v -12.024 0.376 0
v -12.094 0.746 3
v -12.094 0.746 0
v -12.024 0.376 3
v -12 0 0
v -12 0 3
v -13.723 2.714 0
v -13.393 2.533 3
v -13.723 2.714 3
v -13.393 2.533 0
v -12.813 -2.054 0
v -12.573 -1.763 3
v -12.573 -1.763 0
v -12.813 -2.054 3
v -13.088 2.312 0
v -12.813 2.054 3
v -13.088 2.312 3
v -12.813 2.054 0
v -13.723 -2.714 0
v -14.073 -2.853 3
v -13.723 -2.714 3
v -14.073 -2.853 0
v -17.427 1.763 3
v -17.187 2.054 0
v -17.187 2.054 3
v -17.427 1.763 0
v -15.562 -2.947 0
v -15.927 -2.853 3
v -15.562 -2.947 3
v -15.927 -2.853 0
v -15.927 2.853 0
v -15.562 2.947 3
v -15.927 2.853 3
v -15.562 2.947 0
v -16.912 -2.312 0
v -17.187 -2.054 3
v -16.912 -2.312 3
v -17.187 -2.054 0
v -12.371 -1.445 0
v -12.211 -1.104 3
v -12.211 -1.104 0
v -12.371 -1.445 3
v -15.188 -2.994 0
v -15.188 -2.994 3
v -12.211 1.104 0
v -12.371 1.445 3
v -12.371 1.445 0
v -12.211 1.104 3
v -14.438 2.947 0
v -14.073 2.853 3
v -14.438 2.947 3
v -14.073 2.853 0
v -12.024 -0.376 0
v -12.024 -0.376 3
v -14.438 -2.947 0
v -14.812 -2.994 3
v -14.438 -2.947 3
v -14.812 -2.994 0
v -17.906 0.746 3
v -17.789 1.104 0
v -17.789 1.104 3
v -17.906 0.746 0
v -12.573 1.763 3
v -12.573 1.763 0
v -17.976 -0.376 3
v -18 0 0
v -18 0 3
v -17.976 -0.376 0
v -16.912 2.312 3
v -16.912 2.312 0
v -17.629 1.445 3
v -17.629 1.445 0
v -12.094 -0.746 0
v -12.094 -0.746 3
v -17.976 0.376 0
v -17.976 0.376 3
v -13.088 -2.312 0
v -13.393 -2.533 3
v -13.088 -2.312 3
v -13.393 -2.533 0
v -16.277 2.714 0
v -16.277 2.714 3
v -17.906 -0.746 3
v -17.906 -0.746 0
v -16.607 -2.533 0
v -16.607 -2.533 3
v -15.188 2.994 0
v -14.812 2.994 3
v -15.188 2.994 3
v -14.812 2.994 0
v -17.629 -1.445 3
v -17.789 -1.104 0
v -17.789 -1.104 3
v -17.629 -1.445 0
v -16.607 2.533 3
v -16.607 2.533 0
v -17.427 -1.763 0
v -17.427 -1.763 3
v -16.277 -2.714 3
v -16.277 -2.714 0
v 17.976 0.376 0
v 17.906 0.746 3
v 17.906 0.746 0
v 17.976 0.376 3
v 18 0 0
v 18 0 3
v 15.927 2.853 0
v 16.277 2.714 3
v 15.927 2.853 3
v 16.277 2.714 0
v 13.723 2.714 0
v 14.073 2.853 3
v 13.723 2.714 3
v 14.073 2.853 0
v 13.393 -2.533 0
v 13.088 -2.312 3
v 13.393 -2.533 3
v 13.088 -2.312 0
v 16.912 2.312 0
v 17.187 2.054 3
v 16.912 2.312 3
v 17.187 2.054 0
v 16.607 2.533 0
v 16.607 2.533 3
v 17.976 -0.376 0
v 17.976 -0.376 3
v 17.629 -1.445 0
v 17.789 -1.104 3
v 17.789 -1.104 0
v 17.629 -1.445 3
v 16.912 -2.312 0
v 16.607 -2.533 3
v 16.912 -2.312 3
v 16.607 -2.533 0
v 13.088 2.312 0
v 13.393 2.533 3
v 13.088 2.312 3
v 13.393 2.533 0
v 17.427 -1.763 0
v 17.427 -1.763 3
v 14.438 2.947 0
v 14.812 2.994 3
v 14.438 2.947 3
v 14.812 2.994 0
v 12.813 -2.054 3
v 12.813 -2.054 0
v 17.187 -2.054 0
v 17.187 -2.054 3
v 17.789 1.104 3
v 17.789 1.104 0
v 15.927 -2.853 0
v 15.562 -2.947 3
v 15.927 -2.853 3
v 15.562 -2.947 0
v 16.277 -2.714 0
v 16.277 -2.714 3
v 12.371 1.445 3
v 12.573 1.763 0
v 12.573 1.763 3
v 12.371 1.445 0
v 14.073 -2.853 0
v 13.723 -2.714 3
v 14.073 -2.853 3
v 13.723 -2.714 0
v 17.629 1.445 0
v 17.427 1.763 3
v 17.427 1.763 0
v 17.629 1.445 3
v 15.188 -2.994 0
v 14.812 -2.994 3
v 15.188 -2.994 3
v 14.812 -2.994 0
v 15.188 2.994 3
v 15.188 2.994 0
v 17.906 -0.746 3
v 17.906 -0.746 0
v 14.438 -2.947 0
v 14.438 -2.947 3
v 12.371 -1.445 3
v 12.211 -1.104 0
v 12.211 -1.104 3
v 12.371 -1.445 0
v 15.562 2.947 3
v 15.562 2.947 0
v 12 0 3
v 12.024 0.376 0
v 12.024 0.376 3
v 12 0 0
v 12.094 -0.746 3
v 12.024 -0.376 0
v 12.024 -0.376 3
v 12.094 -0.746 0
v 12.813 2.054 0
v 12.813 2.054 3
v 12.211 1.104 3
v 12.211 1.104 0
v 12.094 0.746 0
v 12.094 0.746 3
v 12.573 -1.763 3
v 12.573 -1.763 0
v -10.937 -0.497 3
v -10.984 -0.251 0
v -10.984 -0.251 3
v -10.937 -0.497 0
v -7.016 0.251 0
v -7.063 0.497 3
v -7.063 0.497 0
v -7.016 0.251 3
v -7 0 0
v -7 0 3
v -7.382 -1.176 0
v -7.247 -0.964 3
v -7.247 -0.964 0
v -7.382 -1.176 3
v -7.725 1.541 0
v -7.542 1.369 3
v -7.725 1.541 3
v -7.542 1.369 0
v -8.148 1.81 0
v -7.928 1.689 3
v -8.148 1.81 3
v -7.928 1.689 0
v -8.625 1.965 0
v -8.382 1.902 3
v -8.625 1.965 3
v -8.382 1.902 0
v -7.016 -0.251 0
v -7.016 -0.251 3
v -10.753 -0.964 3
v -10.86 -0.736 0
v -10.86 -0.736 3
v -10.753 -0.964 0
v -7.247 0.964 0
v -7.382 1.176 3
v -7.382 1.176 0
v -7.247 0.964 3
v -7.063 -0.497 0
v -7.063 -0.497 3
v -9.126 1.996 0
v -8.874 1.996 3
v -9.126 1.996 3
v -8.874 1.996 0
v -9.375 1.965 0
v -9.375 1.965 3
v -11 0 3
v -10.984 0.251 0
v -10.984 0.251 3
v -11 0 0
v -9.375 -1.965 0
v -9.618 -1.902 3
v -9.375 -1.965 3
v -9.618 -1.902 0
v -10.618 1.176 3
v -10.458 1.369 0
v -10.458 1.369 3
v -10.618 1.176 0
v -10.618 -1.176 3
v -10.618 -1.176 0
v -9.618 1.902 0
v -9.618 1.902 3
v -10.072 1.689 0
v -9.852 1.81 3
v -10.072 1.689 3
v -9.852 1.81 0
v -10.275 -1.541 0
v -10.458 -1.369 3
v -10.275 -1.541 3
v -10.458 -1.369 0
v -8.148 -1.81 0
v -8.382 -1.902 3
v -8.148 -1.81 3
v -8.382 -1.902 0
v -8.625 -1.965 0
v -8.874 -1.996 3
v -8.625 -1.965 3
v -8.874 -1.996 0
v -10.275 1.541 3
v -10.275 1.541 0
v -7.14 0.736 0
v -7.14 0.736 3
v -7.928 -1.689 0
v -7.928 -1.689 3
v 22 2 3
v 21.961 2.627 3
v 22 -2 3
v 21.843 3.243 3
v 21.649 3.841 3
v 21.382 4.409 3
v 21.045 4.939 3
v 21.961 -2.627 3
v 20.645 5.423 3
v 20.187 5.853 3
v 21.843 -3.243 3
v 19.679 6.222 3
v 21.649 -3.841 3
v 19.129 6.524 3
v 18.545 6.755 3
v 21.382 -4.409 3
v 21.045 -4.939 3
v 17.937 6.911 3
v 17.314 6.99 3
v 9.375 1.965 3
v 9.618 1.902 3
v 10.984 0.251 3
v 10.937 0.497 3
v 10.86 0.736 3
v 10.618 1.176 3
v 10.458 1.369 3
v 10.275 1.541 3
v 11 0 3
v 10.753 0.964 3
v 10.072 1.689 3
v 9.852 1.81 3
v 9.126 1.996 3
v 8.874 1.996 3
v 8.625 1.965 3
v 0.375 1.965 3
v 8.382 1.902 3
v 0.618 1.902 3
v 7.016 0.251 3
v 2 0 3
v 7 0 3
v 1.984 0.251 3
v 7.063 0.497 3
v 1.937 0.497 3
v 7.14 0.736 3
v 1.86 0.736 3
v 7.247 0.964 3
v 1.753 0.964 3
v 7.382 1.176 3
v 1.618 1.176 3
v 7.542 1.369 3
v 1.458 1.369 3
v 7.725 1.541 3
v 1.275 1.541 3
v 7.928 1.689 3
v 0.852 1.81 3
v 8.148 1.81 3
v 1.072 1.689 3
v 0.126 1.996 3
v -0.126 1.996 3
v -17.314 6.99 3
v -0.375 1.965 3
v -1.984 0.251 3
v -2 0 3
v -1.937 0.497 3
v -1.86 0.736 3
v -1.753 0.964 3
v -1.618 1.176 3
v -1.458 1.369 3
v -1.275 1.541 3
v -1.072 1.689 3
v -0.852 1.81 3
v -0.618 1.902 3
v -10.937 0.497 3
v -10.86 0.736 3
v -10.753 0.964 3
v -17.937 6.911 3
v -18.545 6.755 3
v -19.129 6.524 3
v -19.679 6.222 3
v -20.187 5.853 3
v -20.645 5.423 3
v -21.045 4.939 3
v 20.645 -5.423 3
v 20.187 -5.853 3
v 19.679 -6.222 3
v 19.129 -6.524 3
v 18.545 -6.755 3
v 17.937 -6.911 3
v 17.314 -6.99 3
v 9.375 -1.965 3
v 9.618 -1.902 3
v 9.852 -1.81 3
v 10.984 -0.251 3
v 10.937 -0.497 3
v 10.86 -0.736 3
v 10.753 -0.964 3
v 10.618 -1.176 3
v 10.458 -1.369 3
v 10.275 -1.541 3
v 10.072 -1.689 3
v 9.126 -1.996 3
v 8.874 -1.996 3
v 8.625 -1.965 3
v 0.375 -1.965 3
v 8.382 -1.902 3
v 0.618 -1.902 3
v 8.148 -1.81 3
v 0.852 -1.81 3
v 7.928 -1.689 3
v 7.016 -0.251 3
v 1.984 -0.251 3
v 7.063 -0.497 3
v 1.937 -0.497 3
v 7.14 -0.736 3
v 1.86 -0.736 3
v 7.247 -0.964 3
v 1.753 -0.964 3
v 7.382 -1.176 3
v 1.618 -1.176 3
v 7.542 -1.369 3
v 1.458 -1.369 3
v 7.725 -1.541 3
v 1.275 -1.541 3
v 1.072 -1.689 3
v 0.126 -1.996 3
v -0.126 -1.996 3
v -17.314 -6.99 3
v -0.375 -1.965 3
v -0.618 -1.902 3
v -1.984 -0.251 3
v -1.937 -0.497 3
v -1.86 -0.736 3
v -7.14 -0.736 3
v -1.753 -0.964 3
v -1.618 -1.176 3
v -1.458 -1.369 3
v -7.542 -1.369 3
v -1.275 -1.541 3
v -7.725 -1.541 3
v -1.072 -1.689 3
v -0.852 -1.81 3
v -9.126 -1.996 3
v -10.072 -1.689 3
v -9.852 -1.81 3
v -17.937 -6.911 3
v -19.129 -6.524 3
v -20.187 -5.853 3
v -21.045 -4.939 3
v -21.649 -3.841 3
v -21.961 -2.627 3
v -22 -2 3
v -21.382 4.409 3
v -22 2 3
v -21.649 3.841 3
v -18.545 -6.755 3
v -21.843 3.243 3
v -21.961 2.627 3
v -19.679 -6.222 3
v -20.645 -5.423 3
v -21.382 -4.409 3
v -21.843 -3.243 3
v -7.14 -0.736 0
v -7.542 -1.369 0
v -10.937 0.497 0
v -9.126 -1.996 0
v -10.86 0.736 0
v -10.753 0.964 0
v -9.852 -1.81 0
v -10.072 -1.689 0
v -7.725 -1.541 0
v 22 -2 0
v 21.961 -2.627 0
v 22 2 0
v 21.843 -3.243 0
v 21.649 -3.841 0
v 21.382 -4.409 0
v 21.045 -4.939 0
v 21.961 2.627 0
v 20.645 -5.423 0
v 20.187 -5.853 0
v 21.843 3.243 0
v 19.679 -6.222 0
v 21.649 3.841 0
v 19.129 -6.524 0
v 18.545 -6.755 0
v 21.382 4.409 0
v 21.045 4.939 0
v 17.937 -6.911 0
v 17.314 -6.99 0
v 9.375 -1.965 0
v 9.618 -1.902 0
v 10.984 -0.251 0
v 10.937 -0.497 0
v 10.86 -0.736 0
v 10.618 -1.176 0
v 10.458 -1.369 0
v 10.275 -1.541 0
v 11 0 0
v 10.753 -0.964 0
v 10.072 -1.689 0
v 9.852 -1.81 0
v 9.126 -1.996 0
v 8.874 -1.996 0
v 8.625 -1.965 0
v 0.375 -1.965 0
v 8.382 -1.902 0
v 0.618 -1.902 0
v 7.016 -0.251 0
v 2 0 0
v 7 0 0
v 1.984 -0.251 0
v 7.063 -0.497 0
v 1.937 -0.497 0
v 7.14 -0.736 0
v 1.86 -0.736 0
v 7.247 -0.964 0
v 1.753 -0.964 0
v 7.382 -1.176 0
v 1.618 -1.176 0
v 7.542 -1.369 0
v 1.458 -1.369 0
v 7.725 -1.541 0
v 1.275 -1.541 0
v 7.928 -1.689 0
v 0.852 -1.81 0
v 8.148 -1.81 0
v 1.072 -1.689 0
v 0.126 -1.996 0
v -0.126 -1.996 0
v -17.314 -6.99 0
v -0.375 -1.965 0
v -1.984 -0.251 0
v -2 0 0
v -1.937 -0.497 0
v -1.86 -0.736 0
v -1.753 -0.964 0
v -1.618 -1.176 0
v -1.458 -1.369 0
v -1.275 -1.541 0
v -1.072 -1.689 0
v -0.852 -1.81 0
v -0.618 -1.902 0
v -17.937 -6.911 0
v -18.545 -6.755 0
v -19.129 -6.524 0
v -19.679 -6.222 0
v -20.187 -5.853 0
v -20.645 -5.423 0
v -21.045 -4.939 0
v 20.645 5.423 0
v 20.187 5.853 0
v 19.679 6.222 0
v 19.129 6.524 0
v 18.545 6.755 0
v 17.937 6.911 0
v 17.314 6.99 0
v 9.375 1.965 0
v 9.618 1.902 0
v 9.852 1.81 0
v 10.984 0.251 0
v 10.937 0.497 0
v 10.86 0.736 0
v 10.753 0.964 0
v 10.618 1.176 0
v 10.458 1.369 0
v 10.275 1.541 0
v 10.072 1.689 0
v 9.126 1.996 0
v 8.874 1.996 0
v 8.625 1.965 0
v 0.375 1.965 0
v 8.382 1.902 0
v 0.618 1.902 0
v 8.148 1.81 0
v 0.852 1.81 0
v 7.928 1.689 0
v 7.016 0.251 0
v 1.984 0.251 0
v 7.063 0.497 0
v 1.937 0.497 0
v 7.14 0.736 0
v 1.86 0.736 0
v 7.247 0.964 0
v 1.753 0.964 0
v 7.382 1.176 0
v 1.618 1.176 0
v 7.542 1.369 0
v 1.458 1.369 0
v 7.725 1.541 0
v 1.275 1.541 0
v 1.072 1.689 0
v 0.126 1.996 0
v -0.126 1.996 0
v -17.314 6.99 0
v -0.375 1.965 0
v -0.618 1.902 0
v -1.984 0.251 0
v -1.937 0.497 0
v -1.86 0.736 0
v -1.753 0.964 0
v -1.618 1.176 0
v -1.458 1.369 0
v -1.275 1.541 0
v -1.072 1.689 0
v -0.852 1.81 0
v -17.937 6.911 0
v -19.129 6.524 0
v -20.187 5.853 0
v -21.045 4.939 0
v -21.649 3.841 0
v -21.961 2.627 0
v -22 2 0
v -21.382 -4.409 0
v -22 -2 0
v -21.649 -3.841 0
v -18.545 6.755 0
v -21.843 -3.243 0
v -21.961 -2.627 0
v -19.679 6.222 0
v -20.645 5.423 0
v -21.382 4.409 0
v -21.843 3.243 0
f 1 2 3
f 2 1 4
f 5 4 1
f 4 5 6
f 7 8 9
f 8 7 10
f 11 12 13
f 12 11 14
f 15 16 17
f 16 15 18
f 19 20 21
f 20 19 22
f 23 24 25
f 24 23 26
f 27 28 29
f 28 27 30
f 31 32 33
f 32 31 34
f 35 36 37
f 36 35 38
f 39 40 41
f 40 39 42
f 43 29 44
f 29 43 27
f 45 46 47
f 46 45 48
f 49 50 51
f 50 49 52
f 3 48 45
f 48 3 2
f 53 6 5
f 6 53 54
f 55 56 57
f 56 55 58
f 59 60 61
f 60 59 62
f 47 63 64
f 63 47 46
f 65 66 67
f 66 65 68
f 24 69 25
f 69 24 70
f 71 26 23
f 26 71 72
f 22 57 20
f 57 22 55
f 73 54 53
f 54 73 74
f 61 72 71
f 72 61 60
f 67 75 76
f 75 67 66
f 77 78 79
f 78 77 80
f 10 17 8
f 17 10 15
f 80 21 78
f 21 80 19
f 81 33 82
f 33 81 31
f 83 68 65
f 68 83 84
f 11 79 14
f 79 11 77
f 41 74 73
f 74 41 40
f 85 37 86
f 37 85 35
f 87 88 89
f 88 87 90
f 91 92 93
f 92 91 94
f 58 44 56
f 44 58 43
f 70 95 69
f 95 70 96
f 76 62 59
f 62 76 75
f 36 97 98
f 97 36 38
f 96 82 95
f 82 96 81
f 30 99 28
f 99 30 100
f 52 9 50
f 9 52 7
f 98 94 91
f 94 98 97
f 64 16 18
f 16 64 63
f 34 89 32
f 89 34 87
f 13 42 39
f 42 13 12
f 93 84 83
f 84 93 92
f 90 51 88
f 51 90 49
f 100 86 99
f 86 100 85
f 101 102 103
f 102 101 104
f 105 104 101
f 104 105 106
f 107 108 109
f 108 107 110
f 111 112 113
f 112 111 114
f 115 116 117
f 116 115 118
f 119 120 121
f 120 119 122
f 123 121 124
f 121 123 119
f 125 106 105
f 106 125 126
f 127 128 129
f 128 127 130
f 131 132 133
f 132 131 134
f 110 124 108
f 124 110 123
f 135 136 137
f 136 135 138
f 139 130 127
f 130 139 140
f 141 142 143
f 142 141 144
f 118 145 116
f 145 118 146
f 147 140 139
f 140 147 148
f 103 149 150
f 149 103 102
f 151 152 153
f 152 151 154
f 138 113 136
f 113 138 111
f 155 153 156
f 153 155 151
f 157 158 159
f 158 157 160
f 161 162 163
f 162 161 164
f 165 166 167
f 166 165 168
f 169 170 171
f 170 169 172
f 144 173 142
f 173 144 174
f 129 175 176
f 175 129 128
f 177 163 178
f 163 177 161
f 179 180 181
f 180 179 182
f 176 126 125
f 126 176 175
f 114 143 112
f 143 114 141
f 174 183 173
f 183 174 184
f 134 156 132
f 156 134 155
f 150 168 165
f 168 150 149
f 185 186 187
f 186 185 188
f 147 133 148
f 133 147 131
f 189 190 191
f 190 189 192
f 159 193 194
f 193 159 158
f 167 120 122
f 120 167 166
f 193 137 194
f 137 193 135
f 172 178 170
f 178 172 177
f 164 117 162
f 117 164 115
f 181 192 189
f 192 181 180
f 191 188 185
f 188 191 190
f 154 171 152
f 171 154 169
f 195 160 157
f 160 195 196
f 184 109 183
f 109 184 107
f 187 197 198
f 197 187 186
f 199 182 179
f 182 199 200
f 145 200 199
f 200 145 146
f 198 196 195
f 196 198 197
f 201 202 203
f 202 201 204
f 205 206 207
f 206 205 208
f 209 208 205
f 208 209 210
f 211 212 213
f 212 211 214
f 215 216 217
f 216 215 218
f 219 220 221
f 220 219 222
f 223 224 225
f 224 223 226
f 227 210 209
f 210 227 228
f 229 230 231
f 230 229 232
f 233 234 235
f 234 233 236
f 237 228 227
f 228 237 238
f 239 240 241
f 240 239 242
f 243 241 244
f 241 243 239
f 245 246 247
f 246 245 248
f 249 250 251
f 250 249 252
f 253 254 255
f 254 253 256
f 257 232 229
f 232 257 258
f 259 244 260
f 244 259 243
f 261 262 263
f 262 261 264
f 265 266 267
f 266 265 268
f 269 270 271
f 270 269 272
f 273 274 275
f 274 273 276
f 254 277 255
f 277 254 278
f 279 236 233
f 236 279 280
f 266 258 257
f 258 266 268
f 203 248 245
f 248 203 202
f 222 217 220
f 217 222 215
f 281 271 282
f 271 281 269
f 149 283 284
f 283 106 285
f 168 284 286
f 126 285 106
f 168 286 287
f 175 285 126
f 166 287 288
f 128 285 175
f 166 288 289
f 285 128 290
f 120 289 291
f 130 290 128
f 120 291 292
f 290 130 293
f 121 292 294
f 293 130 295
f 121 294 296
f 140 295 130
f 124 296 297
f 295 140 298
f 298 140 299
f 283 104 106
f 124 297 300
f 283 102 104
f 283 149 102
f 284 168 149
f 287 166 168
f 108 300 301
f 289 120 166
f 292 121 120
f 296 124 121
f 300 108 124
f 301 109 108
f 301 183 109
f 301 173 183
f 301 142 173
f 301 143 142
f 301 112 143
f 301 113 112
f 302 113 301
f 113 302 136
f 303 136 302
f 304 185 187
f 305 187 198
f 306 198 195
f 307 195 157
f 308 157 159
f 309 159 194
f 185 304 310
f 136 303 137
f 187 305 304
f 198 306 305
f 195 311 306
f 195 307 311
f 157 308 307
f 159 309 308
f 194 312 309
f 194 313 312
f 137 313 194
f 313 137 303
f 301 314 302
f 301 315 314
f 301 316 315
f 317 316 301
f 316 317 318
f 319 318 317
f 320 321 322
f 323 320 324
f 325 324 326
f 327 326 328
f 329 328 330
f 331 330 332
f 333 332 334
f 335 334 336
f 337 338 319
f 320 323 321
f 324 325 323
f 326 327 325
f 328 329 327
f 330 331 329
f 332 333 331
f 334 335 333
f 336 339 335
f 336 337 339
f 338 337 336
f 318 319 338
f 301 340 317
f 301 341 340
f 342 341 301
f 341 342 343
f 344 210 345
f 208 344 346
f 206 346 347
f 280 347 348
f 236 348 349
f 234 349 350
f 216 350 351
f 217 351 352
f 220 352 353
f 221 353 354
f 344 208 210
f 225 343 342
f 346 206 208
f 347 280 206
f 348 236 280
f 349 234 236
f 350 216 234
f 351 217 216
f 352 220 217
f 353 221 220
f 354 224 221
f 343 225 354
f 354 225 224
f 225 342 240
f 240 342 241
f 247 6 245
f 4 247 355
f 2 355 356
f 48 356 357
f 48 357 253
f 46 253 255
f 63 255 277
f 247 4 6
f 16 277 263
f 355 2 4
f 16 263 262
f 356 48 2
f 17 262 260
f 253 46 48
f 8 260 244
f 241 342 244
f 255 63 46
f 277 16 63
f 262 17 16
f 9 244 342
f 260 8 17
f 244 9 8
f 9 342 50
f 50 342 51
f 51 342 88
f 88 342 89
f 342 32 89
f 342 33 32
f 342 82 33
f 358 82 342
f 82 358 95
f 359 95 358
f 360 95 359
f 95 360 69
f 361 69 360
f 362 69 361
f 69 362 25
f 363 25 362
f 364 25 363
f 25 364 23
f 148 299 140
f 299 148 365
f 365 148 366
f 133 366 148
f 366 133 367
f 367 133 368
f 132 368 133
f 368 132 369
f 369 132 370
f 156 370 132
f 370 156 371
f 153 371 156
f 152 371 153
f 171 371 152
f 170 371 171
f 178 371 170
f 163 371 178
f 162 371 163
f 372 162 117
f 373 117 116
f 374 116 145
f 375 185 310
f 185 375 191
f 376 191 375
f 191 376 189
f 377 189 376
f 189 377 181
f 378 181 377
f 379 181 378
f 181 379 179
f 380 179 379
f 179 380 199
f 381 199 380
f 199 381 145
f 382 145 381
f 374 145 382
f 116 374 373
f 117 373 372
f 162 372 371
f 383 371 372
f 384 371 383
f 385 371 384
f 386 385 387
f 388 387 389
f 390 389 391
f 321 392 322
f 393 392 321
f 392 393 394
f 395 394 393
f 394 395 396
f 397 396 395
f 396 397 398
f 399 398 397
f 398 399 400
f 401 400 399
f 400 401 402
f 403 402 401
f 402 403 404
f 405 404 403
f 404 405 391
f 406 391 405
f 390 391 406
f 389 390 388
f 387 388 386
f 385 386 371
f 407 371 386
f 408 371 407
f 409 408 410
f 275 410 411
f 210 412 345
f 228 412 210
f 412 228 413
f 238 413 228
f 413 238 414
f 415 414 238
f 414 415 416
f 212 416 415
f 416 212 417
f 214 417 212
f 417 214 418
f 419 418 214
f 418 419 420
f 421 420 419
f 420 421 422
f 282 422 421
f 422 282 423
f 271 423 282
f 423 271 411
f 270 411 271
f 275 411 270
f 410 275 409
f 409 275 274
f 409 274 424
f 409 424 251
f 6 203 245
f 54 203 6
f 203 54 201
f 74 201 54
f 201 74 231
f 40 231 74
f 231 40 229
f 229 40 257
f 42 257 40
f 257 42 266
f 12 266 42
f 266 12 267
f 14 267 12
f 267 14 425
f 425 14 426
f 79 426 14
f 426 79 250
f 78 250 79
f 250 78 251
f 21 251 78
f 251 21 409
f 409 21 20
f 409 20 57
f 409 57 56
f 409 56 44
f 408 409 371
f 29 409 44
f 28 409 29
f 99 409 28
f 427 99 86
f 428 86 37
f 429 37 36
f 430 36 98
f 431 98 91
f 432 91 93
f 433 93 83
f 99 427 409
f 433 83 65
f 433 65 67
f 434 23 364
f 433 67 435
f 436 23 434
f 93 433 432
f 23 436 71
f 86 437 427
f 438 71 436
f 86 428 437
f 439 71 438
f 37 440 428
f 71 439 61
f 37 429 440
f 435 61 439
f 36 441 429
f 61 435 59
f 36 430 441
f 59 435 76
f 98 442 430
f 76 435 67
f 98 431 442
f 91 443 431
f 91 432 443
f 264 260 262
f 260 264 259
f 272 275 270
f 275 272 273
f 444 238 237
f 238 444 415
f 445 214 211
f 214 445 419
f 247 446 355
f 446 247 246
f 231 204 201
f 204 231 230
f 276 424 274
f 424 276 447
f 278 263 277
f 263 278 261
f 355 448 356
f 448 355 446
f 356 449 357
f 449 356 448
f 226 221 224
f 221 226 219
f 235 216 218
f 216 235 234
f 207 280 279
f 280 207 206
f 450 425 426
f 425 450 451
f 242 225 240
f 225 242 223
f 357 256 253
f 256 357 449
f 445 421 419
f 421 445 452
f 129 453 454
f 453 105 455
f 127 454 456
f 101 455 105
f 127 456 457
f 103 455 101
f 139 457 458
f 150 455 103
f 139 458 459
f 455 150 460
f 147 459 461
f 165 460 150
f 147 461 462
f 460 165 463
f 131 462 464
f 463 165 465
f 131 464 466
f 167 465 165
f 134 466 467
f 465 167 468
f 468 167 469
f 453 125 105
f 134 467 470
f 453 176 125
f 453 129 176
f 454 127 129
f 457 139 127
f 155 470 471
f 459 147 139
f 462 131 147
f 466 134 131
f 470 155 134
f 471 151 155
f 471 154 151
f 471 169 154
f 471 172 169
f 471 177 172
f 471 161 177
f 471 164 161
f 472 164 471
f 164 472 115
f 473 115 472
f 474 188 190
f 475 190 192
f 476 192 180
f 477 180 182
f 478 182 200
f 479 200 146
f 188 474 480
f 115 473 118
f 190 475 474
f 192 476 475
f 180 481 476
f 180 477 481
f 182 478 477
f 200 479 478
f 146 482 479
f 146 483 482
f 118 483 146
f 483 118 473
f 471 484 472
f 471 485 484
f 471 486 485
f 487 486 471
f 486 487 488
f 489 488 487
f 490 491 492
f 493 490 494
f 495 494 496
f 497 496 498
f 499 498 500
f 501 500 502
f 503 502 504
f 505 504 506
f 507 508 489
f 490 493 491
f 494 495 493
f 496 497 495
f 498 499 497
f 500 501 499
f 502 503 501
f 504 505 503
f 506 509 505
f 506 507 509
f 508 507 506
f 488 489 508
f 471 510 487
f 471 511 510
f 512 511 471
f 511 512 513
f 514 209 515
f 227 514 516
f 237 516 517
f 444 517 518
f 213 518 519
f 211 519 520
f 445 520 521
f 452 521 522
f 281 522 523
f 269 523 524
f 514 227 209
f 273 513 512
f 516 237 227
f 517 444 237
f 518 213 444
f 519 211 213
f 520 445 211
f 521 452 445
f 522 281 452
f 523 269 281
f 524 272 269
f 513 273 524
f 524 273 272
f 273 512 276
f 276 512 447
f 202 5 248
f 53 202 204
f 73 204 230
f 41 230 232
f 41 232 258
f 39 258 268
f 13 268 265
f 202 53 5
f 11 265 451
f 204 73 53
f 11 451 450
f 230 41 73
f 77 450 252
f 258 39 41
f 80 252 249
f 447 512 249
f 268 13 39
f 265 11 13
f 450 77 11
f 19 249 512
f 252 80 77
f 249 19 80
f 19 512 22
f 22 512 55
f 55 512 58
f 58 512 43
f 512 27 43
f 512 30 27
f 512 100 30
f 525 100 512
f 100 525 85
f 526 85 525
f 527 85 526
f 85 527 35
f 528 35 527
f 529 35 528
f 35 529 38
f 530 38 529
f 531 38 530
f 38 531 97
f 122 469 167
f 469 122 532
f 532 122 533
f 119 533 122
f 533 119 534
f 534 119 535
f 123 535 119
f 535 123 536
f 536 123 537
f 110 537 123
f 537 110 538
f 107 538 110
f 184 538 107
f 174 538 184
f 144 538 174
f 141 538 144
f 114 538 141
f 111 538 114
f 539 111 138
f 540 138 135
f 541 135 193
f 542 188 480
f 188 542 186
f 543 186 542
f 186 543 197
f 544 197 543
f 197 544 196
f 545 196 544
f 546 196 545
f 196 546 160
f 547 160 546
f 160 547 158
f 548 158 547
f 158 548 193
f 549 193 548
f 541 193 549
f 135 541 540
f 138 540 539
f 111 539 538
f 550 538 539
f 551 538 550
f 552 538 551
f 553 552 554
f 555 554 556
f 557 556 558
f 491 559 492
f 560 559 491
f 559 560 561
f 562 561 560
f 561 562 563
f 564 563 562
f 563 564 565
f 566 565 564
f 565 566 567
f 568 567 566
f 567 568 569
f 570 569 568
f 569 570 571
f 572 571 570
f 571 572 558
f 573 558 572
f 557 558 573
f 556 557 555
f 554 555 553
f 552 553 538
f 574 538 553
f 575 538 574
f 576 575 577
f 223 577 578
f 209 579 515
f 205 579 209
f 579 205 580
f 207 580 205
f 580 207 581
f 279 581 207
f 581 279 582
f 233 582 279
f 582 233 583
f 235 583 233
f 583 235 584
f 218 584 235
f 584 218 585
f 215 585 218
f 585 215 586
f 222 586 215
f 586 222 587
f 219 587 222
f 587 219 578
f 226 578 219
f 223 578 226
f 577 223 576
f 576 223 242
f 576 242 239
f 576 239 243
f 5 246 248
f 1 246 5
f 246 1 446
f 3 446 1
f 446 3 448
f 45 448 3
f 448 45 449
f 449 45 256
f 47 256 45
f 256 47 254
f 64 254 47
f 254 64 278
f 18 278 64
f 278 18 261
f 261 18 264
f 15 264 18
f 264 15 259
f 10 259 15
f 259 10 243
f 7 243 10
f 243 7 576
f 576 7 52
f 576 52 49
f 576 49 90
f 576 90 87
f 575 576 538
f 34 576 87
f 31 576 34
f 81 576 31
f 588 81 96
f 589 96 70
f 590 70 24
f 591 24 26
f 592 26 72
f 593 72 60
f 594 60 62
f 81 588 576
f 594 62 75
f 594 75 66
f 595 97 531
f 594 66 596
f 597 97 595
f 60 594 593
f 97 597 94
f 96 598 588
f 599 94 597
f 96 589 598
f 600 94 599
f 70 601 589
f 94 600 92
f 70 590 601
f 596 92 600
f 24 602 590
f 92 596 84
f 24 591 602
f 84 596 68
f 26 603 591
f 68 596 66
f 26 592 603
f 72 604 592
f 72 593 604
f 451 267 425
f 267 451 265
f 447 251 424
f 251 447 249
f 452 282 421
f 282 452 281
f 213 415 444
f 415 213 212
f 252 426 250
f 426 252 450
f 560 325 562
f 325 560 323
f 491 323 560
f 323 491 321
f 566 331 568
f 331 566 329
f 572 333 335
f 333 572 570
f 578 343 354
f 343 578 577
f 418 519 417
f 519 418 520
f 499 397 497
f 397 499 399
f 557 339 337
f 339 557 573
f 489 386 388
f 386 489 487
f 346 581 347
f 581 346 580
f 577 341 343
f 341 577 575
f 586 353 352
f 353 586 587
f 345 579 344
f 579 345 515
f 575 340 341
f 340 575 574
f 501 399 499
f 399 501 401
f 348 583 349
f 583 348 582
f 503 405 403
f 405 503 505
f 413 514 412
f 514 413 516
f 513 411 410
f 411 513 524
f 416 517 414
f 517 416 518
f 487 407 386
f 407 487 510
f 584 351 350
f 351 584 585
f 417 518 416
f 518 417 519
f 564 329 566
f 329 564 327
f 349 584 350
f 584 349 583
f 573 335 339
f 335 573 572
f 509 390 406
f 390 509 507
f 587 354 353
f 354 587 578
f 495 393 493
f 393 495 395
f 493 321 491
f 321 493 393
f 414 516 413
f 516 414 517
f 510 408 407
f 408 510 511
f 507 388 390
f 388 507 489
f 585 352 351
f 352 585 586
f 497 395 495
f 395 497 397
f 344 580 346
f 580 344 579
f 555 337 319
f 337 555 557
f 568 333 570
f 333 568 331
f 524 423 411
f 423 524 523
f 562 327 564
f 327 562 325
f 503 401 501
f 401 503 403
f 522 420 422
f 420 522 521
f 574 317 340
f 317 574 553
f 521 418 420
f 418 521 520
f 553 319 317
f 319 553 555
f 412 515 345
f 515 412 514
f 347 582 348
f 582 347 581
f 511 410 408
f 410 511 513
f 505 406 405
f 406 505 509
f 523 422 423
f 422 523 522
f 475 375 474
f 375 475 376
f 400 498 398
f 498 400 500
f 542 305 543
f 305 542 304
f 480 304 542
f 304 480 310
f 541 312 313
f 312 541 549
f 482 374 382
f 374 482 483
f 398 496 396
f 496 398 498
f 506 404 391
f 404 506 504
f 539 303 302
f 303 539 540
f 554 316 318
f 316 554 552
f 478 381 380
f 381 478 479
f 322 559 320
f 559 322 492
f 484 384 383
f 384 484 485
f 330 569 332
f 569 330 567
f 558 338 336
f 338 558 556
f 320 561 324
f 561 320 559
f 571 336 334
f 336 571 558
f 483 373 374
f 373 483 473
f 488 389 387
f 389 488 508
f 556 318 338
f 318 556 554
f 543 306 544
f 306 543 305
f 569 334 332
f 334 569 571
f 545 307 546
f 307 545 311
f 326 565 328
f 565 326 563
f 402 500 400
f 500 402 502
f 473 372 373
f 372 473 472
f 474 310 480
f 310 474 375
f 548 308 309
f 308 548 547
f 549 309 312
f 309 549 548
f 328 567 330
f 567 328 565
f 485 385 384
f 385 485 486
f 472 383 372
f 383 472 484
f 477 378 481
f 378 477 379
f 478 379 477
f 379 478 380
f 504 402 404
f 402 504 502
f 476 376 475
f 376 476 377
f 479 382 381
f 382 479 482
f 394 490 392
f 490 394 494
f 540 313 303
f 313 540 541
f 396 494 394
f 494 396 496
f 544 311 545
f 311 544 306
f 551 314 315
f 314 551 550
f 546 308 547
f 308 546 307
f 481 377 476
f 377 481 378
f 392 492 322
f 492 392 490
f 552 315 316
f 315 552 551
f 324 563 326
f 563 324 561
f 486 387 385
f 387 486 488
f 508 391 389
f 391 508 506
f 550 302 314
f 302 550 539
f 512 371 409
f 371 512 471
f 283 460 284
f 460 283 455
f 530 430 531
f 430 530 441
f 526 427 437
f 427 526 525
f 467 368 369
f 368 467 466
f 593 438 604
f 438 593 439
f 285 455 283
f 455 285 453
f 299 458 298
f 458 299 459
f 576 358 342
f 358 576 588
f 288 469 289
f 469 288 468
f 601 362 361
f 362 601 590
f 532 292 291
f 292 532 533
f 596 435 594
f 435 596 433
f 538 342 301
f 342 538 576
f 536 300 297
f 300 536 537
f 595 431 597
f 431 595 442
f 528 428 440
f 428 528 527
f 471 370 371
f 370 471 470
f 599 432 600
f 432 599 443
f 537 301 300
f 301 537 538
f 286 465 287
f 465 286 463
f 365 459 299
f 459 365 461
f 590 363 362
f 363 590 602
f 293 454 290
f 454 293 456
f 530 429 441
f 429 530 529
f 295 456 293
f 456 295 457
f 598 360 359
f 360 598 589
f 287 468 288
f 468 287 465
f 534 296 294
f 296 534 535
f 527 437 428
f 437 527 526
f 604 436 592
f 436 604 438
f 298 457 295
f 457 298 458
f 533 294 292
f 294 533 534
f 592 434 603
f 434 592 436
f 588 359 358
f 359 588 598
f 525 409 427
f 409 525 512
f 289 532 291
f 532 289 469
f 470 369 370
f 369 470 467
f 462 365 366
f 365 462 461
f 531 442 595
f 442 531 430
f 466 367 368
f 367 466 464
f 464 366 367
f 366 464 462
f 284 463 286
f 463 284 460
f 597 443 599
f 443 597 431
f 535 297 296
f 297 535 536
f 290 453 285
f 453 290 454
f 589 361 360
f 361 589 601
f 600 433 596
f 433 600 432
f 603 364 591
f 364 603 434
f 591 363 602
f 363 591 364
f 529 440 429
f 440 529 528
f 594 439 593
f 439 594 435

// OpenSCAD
$fn = 50;


difference() {
	union() {
		hull() {
			translate(v = [-17.0000000000, 2.0000000000, 0]) {
				cylinder(h = 3, r = 5);
			}
			translate(v = [17.0000000000, 2.0000000000, 0]) {
				cylinder(h = 3, r = 5);
			}
			translate(v = [-17.0000000000, -2.0000000000, 0]) {
				cylinder(h = 3, r = 5);
			}
			translate(v = [17.0000000000, -2.0000000000, 0]) {
				cylinder(h = 3, r = 5);
			}
		}
	}
	union() {
		#translate(v = [-15.0000000000, 0.0000000000, 0]) {
			cylinder(h = 3, r = 3.0000000000);
		}
		#translate(v = [15.0000000000, 0.0000000000, 0]) {
			cylinder(h = 3, r = 3.0000000000);
		}
		#translate(v = [-15.0000000000, 0.0000000000, -100.0000000000]) {
			cylinder(h = 200, r = 3.0000000000);
		}
		#translate(v = [-15.0000000000, 0.0000000000, -100.0000000000]) {
			cylinder(h = 200, r = 3.0000000000);
		}
		#translate(v = [15.0000000000, 0.0000000000, -100.0000000000]) {
			cylinder(h = 200, r = 3.0000000000);
		}
		#translate(v = [15.0000000000, 0.0000000000, -100.0000000000]) {
			cylinder(h = 200, r = 3.0000000000);
		}
		#translate(v = [-15.0000000000, 0.0000000000, 0]) {
			cylinder(h = 3, r = 1.5000000000);
		}
		#translate(v = [15.0000000000, 0.0000000000, 0]) {
			cylinder(h = 3, r = 1.5000000000);
		}
		#translate(v = [-15.0000000000, 0.0000000000, 0]) {
			cylinder(h = 3, r = 1.5000000000);
		}
		#translate(v = [15.0000000000, 0.0000000000, 0]) {
			cylinder(h = 3, r = 1.5000000000);
		}
		#translate(v = [-15.0000000000, 0.0000000000, 0]) {
			cylinder(h = 3, r = 1.5000000000);
		}
		#translate(v = [15.0000000000, 0.0000000000, 0]) {
			cylinder(h = 3, r = 1.5000000000);
		}
		#translate(v = [-9.0000000000, 0, 0]) {
			cylinder(h = 3, r = 2.0000000000);
		}
		#cylinder(h = 3, r = 2.0000000000);
		#translate(v = [9.0000000000, 0, 0]) {
			cylinder(h = 3, r = 2.0000000000);
		}
	}
}
